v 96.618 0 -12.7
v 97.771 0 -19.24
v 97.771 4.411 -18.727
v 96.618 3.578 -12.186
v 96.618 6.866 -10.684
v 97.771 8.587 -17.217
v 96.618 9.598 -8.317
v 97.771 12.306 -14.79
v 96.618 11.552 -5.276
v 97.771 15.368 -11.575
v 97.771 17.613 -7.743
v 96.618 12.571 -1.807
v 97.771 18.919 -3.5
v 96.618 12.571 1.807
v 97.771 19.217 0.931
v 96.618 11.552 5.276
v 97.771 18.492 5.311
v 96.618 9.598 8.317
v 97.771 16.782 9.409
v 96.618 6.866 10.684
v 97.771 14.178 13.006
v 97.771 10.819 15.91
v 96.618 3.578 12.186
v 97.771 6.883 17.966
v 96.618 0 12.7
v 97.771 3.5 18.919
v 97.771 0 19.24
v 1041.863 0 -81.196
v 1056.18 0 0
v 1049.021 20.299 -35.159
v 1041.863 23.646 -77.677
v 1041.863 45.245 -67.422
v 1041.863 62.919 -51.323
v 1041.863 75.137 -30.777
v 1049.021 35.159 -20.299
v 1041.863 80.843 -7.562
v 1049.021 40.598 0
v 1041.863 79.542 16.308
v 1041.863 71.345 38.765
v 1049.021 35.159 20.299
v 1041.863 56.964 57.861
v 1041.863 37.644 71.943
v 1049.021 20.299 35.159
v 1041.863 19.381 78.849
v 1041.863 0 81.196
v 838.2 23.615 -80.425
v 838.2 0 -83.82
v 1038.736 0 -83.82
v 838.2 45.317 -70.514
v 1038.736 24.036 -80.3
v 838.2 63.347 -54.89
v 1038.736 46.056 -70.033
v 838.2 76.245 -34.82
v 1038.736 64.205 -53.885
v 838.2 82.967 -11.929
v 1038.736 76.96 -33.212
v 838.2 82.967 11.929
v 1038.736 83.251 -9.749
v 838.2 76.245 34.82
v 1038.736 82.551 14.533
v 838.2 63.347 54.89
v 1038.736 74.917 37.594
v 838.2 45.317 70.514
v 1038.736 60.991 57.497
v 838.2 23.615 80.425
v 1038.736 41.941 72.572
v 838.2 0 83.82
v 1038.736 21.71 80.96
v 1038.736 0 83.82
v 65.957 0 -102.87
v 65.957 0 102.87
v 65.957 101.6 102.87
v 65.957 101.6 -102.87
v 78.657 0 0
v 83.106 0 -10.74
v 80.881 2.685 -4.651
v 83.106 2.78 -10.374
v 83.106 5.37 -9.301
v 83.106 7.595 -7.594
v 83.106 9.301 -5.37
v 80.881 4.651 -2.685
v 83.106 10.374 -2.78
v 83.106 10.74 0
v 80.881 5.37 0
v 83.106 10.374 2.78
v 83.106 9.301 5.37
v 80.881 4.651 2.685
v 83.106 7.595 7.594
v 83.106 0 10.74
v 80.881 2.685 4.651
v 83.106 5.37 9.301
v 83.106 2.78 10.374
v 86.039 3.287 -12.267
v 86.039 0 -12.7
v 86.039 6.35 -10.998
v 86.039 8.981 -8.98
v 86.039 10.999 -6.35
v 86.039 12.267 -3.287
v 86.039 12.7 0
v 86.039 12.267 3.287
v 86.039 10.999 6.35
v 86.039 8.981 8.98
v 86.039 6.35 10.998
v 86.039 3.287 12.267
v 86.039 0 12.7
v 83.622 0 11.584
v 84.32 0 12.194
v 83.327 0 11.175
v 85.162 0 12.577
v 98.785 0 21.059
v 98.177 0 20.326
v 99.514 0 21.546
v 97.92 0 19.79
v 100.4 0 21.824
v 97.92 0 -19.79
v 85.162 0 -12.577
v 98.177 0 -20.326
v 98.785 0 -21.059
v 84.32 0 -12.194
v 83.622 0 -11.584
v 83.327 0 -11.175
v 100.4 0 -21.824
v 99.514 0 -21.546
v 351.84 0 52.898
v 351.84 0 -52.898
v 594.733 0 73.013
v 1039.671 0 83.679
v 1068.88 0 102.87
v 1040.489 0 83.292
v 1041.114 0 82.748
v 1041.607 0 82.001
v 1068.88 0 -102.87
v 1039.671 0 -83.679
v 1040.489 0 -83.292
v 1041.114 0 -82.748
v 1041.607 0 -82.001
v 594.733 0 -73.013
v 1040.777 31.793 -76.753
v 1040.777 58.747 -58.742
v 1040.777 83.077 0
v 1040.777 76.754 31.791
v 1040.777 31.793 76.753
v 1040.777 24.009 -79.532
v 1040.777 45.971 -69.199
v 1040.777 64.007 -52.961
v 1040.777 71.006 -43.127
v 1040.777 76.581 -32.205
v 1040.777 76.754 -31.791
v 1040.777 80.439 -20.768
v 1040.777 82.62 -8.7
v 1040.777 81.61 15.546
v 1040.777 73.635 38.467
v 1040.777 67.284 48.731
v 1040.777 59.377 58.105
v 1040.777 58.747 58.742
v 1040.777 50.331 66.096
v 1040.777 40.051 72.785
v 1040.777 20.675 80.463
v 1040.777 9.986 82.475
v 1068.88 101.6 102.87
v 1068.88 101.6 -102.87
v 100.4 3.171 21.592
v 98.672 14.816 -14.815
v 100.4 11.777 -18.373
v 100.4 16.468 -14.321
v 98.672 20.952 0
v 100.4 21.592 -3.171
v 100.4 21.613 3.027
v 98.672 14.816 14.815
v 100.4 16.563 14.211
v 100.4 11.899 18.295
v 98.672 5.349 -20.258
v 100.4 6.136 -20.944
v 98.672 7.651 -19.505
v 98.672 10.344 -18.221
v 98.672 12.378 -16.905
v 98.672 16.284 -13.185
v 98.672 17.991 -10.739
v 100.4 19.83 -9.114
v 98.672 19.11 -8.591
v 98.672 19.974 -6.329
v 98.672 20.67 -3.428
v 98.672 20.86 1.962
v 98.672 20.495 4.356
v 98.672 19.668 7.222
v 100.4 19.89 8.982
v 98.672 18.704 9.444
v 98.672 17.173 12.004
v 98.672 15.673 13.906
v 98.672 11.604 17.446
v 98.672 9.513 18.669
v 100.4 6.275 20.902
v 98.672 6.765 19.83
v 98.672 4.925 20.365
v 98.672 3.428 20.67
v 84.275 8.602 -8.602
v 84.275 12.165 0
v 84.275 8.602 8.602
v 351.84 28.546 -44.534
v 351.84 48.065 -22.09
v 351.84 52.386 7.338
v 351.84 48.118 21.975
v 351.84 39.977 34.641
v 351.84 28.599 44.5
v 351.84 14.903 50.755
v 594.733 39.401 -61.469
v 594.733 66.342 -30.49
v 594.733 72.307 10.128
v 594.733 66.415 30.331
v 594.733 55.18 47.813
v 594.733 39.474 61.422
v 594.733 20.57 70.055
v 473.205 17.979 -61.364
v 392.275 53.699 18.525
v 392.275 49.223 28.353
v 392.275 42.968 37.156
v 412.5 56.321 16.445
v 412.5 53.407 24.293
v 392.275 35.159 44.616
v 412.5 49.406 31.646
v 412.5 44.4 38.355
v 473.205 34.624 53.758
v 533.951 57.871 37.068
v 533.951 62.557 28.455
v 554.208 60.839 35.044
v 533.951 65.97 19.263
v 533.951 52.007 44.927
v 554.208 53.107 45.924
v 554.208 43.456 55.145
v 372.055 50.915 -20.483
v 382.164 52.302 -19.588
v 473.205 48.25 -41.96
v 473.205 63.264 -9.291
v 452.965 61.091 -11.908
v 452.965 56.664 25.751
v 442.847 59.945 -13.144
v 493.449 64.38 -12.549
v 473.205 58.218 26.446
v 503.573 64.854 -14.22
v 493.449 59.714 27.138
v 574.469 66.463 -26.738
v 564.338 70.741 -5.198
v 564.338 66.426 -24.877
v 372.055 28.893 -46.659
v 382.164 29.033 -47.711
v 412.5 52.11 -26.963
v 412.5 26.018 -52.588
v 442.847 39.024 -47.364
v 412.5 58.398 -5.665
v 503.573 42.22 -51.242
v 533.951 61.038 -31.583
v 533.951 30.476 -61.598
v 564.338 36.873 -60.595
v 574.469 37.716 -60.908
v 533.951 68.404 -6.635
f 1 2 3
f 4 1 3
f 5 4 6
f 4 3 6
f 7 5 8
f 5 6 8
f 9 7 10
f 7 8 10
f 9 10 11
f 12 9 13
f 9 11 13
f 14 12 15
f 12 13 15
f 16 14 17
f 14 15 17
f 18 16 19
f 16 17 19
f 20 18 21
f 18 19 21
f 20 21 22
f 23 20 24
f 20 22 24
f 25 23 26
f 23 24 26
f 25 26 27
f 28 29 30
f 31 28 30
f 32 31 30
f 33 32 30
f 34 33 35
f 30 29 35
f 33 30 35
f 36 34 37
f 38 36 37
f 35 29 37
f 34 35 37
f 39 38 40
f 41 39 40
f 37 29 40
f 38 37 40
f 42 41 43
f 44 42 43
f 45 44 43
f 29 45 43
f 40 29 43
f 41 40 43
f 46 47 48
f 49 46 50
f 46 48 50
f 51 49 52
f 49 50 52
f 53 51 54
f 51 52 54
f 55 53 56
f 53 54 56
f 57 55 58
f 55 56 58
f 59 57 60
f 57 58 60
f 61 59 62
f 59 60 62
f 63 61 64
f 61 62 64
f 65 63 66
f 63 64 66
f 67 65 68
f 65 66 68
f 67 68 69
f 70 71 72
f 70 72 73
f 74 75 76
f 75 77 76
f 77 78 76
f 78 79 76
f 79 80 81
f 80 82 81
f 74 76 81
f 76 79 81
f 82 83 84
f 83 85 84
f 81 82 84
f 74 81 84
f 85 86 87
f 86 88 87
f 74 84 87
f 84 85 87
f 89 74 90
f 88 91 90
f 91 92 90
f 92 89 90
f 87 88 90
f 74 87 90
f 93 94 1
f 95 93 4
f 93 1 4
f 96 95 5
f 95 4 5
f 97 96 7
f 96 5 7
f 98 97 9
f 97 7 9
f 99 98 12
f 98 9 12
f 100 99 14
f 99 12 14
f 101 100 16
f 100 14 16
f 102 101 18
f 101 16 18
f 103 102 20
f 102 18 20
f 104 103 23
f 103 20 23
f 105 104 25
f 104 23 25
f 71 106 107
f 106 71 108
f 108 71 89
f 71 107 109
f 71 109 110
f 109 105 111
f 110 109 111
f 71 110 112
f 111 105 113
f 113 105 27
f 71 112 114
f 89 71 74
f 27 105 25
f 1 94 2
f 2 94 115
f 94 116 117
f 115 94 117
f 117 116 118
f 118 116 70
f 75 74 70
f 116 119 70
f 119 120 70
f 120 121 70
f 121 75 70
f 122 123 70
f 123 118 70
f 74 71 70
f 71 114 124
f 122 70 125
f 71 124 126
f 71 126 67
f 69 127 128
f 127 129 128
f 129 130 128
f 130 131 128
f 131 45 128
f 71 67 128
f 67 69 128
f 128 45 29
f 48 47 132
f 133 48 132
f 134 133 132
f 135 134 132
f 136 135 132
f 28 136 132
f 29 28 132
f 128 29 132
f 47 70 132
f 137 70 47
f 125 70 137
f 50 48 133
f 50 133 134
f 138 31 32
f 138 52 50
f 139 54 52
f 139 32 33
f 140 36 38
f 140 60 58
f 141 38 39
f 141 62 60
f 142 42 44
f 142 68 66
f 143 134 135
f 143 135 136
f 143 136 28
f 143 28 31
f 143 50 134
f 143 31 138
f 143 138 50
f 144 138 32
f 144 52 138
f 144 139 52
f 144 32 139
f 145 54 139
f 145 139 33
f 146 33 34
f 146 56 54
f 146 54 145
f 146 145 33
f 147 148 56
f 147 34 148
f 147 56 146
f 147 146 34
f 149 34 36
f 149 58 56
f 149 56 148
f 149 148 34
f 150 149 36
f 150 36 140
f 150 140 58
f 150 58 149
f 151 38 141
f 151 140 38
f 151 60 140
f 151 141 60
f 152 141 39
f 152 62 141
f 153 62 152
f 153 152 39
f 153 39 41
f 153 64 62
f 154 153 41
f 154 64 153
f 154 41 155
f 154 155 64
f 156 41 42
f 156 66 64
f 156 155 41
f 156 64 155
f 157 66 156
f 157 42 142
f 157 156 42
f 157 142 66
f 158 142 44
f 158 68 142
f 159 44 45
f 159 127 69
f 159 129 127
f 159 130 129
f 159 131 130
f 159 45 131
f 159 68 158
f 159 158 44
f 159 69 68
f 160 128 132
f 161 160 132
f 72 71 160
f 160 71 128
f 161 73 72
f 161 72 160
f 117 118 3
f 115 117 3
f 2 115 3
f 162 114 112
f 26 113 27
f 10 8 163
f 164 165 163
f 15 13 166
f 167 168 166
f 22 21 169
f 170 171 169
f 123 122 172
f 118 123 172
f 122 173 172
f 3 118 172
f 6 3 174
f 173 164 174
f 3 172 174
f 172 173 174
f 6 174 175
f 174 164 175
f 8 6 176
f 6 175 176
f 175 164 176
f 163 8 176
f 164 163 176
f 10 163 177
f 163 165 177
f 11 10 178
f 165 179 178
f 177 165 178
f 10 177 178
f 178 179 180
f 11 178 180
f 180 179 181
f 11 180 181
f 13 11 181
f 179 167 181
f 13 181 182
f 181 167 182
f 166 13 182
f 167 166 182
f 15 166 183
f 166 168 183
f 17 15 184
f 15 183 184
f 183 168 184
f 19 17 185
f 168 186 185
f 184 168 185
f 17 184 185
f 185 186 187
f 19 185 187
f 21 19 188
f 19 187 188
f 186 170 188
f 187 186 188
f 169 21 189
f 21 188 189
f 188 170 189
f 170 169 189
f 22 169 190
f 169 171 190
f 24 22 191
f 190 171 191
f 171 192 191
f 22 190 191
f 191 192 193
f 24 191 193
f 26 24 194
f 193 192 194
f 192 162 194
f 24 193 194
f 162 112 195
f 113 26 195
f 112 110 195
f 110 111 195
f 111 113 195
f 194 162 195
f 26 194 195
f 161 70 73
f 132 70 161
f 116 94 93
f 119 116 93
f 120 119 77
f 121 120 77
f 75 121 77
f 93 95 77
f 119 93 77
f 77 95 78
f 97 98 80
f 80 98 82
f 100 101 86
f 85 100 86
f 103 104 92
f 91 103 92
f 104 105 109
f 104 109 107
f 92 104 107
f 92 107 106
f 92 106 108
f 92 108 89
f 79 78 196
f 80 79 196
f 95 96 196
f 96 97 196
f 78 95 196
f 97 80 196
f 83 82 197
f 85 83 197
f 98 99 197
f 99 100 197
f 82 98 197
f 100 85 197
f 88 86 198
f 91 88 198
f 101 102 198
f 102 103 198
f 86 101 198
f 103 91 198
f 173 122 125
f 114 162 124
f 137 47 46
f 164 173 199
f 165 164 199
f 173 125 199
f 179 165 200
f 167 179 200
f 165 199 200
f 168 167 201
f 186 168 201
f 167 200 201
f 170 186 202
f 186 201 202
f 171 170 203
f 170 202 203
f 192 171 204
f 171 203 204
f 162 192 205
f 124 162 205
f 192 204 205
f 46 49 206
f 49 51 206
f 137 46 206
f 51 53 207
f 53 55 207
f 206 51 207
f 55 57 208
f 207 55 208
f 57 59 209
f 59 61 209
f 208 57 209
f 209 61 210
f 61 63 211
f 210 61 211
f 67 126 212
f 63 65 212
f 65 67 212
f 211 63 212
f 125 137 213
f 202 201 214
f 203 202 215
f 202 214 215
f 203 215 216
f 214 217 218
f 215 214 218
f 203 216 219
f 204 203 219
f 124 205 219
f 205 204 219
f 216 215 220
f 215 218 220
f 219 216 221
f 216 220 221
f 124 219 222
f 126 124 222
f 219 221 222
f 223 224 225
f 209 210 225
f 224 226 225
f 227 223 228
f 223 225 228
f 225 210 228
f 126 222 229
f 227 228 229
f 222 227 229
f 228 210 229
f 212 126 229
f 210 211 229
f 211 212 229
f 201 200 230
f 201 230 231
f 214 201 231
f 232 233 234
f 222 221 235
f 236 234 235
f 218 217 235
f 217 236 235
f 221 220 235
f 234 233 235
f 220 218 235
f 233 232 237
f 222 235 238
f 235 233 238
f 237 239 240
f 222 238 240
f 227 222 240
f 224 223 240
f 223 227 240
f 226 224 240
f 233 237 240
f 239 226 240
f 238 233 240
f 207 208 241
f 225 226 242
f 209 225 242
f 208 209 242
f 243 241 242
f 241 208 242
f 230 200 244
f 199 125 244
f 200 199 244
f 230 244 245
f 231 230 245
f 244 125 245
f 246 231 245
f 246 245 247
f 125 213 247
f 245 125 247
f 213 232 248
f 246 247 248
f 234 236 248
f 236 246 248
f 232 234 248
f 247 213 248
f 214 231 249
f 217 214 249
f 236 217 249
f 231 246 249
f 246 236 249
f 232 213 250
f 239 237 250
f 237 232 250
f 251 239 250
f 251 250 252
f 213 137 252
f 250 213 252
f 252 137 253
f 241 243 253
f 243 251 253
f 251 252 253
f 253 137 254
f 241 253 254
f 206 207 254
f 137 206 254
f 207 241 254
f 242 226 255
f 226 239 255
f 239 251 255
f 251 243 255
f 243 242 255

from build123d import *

# Parameters (mm, degrees)
REVOLVE1_ANGLE      = 180
SKETCH5_W           = 1002.922685695
SKETCH5_H           = 205.74
BOSS_EXTRUDE1_DEPTH = 38.1
SKETCH9_W           = 1002.922685695
SKETCH9_H           = 205.74
BOSS_EXTRUDE5_DEPTH = 101.6
FILLET1_R           = 3.175


with BuildPart() as part:
    # Sketch4 → Revolve1 (revolve)
    with BuildSketch(Plane(origin=(0, 0, 0), x_dir=(1, 0, 0), z_dir=(0, 1, 0))):
        with BuildLine():
            Line((838.2, 83.82), (1041.4, 83.82))
            Line((1041.4, 83.82), (1056.179727523, 0))
            Line((1056.179727523, 0), (78.657041828, 0))
            Line((78.657041828, 0), (83.91755407, 12.7))
            Line((83.91755407, 12.7), (96.61755407, 12.7))
            Line((96.61755407, 12.7), (98.163568293, 21.467882356))
            add(Edge.make_bspline(
                [(98.163568293, 21.467882356), (104.607343896, 22.497734344), (123.856103977, 25.493761031), (155.955742042, 30.152377402), (200.954778344, 36.105690484), (252.401123307, 42.315924819), (303.903852309, 48.038821007), (355.451699359, 53.337793152), (407.03781513, 58.250071041), (458.657158448, 62.799072617), (510.306365901, 66.995530477), (561.982906562, 70.840728542), (613.685068308, 74.325147511), (665.411655565, 77.427095788), (710.693213075, 79.771298327), (749.520698447, 81.471395458), (780.831665683, 82.597974895), (801.90983421, 83.214282129), (819.226060023, 83.601016067), (830.067936093, 83.761922773), (835.489248784, 83.813260117), (838.2, 83.82)],
                knots=[0.119382499, 0.119382499, 0.119382499, 0.119382499, 0.119382499, 0.150314205, 0.211721038, 0.273127872, 0.334534706, 0.395941541, 0.457348376, 0.518755211, 0.580162046, 0.641568881, 0.702975716, 0.764382551, 0.825789386, 0.887196222, 0.917899639, 0.948603057, 0.974301528, 0.987150764, 1, 1, 1, 1, 1], degree=4))
        make_face()
    revolve(axis=Axis((0, 0, 0), (1, 0, 0)), revolution_arc=REVOLVE1_ANGLE)

    # Sketch5 → Boss-Extrude1 (add)
    with BuildSketch(Plane.XZ):
        with Locations((567.418384676, 0)):
            Rectangle(SKETCH5_W, SKETCH5_H)
    extrude(amount=BOSS_EXTRUDE1_DEPTH)


with BuildPart() as body_2:
    # Sketch9 → Boss-Extrude5 (new body)
    with BuildSketch(Plane(origin=(0, 0, 0), x_dir=(1, 0, 0), z_dir=(0, 1, 0))):
        with Locations((567.418384676, 0)):
            Rectangle(SKETCH9_W, SKETCH9_H)
    extrude(amount=BOSS_EXTRUDE5_DEPTH)

    # Combine1: cut part
    add(part.part, mode=Mode.SUBTRACT)

    # Fillet1
    fillet1_edges = [body_2.edges().sort_by_distance(p)[0] for p in [
        (1041.4, 83.82, 0),
        (98.163568293, 21.467882356, 0),
        (83.91755407, 12.7, 0),
    ]]
    fillet(fillet1_edges, radius=FILLET1_R)


solid = body_2.part
